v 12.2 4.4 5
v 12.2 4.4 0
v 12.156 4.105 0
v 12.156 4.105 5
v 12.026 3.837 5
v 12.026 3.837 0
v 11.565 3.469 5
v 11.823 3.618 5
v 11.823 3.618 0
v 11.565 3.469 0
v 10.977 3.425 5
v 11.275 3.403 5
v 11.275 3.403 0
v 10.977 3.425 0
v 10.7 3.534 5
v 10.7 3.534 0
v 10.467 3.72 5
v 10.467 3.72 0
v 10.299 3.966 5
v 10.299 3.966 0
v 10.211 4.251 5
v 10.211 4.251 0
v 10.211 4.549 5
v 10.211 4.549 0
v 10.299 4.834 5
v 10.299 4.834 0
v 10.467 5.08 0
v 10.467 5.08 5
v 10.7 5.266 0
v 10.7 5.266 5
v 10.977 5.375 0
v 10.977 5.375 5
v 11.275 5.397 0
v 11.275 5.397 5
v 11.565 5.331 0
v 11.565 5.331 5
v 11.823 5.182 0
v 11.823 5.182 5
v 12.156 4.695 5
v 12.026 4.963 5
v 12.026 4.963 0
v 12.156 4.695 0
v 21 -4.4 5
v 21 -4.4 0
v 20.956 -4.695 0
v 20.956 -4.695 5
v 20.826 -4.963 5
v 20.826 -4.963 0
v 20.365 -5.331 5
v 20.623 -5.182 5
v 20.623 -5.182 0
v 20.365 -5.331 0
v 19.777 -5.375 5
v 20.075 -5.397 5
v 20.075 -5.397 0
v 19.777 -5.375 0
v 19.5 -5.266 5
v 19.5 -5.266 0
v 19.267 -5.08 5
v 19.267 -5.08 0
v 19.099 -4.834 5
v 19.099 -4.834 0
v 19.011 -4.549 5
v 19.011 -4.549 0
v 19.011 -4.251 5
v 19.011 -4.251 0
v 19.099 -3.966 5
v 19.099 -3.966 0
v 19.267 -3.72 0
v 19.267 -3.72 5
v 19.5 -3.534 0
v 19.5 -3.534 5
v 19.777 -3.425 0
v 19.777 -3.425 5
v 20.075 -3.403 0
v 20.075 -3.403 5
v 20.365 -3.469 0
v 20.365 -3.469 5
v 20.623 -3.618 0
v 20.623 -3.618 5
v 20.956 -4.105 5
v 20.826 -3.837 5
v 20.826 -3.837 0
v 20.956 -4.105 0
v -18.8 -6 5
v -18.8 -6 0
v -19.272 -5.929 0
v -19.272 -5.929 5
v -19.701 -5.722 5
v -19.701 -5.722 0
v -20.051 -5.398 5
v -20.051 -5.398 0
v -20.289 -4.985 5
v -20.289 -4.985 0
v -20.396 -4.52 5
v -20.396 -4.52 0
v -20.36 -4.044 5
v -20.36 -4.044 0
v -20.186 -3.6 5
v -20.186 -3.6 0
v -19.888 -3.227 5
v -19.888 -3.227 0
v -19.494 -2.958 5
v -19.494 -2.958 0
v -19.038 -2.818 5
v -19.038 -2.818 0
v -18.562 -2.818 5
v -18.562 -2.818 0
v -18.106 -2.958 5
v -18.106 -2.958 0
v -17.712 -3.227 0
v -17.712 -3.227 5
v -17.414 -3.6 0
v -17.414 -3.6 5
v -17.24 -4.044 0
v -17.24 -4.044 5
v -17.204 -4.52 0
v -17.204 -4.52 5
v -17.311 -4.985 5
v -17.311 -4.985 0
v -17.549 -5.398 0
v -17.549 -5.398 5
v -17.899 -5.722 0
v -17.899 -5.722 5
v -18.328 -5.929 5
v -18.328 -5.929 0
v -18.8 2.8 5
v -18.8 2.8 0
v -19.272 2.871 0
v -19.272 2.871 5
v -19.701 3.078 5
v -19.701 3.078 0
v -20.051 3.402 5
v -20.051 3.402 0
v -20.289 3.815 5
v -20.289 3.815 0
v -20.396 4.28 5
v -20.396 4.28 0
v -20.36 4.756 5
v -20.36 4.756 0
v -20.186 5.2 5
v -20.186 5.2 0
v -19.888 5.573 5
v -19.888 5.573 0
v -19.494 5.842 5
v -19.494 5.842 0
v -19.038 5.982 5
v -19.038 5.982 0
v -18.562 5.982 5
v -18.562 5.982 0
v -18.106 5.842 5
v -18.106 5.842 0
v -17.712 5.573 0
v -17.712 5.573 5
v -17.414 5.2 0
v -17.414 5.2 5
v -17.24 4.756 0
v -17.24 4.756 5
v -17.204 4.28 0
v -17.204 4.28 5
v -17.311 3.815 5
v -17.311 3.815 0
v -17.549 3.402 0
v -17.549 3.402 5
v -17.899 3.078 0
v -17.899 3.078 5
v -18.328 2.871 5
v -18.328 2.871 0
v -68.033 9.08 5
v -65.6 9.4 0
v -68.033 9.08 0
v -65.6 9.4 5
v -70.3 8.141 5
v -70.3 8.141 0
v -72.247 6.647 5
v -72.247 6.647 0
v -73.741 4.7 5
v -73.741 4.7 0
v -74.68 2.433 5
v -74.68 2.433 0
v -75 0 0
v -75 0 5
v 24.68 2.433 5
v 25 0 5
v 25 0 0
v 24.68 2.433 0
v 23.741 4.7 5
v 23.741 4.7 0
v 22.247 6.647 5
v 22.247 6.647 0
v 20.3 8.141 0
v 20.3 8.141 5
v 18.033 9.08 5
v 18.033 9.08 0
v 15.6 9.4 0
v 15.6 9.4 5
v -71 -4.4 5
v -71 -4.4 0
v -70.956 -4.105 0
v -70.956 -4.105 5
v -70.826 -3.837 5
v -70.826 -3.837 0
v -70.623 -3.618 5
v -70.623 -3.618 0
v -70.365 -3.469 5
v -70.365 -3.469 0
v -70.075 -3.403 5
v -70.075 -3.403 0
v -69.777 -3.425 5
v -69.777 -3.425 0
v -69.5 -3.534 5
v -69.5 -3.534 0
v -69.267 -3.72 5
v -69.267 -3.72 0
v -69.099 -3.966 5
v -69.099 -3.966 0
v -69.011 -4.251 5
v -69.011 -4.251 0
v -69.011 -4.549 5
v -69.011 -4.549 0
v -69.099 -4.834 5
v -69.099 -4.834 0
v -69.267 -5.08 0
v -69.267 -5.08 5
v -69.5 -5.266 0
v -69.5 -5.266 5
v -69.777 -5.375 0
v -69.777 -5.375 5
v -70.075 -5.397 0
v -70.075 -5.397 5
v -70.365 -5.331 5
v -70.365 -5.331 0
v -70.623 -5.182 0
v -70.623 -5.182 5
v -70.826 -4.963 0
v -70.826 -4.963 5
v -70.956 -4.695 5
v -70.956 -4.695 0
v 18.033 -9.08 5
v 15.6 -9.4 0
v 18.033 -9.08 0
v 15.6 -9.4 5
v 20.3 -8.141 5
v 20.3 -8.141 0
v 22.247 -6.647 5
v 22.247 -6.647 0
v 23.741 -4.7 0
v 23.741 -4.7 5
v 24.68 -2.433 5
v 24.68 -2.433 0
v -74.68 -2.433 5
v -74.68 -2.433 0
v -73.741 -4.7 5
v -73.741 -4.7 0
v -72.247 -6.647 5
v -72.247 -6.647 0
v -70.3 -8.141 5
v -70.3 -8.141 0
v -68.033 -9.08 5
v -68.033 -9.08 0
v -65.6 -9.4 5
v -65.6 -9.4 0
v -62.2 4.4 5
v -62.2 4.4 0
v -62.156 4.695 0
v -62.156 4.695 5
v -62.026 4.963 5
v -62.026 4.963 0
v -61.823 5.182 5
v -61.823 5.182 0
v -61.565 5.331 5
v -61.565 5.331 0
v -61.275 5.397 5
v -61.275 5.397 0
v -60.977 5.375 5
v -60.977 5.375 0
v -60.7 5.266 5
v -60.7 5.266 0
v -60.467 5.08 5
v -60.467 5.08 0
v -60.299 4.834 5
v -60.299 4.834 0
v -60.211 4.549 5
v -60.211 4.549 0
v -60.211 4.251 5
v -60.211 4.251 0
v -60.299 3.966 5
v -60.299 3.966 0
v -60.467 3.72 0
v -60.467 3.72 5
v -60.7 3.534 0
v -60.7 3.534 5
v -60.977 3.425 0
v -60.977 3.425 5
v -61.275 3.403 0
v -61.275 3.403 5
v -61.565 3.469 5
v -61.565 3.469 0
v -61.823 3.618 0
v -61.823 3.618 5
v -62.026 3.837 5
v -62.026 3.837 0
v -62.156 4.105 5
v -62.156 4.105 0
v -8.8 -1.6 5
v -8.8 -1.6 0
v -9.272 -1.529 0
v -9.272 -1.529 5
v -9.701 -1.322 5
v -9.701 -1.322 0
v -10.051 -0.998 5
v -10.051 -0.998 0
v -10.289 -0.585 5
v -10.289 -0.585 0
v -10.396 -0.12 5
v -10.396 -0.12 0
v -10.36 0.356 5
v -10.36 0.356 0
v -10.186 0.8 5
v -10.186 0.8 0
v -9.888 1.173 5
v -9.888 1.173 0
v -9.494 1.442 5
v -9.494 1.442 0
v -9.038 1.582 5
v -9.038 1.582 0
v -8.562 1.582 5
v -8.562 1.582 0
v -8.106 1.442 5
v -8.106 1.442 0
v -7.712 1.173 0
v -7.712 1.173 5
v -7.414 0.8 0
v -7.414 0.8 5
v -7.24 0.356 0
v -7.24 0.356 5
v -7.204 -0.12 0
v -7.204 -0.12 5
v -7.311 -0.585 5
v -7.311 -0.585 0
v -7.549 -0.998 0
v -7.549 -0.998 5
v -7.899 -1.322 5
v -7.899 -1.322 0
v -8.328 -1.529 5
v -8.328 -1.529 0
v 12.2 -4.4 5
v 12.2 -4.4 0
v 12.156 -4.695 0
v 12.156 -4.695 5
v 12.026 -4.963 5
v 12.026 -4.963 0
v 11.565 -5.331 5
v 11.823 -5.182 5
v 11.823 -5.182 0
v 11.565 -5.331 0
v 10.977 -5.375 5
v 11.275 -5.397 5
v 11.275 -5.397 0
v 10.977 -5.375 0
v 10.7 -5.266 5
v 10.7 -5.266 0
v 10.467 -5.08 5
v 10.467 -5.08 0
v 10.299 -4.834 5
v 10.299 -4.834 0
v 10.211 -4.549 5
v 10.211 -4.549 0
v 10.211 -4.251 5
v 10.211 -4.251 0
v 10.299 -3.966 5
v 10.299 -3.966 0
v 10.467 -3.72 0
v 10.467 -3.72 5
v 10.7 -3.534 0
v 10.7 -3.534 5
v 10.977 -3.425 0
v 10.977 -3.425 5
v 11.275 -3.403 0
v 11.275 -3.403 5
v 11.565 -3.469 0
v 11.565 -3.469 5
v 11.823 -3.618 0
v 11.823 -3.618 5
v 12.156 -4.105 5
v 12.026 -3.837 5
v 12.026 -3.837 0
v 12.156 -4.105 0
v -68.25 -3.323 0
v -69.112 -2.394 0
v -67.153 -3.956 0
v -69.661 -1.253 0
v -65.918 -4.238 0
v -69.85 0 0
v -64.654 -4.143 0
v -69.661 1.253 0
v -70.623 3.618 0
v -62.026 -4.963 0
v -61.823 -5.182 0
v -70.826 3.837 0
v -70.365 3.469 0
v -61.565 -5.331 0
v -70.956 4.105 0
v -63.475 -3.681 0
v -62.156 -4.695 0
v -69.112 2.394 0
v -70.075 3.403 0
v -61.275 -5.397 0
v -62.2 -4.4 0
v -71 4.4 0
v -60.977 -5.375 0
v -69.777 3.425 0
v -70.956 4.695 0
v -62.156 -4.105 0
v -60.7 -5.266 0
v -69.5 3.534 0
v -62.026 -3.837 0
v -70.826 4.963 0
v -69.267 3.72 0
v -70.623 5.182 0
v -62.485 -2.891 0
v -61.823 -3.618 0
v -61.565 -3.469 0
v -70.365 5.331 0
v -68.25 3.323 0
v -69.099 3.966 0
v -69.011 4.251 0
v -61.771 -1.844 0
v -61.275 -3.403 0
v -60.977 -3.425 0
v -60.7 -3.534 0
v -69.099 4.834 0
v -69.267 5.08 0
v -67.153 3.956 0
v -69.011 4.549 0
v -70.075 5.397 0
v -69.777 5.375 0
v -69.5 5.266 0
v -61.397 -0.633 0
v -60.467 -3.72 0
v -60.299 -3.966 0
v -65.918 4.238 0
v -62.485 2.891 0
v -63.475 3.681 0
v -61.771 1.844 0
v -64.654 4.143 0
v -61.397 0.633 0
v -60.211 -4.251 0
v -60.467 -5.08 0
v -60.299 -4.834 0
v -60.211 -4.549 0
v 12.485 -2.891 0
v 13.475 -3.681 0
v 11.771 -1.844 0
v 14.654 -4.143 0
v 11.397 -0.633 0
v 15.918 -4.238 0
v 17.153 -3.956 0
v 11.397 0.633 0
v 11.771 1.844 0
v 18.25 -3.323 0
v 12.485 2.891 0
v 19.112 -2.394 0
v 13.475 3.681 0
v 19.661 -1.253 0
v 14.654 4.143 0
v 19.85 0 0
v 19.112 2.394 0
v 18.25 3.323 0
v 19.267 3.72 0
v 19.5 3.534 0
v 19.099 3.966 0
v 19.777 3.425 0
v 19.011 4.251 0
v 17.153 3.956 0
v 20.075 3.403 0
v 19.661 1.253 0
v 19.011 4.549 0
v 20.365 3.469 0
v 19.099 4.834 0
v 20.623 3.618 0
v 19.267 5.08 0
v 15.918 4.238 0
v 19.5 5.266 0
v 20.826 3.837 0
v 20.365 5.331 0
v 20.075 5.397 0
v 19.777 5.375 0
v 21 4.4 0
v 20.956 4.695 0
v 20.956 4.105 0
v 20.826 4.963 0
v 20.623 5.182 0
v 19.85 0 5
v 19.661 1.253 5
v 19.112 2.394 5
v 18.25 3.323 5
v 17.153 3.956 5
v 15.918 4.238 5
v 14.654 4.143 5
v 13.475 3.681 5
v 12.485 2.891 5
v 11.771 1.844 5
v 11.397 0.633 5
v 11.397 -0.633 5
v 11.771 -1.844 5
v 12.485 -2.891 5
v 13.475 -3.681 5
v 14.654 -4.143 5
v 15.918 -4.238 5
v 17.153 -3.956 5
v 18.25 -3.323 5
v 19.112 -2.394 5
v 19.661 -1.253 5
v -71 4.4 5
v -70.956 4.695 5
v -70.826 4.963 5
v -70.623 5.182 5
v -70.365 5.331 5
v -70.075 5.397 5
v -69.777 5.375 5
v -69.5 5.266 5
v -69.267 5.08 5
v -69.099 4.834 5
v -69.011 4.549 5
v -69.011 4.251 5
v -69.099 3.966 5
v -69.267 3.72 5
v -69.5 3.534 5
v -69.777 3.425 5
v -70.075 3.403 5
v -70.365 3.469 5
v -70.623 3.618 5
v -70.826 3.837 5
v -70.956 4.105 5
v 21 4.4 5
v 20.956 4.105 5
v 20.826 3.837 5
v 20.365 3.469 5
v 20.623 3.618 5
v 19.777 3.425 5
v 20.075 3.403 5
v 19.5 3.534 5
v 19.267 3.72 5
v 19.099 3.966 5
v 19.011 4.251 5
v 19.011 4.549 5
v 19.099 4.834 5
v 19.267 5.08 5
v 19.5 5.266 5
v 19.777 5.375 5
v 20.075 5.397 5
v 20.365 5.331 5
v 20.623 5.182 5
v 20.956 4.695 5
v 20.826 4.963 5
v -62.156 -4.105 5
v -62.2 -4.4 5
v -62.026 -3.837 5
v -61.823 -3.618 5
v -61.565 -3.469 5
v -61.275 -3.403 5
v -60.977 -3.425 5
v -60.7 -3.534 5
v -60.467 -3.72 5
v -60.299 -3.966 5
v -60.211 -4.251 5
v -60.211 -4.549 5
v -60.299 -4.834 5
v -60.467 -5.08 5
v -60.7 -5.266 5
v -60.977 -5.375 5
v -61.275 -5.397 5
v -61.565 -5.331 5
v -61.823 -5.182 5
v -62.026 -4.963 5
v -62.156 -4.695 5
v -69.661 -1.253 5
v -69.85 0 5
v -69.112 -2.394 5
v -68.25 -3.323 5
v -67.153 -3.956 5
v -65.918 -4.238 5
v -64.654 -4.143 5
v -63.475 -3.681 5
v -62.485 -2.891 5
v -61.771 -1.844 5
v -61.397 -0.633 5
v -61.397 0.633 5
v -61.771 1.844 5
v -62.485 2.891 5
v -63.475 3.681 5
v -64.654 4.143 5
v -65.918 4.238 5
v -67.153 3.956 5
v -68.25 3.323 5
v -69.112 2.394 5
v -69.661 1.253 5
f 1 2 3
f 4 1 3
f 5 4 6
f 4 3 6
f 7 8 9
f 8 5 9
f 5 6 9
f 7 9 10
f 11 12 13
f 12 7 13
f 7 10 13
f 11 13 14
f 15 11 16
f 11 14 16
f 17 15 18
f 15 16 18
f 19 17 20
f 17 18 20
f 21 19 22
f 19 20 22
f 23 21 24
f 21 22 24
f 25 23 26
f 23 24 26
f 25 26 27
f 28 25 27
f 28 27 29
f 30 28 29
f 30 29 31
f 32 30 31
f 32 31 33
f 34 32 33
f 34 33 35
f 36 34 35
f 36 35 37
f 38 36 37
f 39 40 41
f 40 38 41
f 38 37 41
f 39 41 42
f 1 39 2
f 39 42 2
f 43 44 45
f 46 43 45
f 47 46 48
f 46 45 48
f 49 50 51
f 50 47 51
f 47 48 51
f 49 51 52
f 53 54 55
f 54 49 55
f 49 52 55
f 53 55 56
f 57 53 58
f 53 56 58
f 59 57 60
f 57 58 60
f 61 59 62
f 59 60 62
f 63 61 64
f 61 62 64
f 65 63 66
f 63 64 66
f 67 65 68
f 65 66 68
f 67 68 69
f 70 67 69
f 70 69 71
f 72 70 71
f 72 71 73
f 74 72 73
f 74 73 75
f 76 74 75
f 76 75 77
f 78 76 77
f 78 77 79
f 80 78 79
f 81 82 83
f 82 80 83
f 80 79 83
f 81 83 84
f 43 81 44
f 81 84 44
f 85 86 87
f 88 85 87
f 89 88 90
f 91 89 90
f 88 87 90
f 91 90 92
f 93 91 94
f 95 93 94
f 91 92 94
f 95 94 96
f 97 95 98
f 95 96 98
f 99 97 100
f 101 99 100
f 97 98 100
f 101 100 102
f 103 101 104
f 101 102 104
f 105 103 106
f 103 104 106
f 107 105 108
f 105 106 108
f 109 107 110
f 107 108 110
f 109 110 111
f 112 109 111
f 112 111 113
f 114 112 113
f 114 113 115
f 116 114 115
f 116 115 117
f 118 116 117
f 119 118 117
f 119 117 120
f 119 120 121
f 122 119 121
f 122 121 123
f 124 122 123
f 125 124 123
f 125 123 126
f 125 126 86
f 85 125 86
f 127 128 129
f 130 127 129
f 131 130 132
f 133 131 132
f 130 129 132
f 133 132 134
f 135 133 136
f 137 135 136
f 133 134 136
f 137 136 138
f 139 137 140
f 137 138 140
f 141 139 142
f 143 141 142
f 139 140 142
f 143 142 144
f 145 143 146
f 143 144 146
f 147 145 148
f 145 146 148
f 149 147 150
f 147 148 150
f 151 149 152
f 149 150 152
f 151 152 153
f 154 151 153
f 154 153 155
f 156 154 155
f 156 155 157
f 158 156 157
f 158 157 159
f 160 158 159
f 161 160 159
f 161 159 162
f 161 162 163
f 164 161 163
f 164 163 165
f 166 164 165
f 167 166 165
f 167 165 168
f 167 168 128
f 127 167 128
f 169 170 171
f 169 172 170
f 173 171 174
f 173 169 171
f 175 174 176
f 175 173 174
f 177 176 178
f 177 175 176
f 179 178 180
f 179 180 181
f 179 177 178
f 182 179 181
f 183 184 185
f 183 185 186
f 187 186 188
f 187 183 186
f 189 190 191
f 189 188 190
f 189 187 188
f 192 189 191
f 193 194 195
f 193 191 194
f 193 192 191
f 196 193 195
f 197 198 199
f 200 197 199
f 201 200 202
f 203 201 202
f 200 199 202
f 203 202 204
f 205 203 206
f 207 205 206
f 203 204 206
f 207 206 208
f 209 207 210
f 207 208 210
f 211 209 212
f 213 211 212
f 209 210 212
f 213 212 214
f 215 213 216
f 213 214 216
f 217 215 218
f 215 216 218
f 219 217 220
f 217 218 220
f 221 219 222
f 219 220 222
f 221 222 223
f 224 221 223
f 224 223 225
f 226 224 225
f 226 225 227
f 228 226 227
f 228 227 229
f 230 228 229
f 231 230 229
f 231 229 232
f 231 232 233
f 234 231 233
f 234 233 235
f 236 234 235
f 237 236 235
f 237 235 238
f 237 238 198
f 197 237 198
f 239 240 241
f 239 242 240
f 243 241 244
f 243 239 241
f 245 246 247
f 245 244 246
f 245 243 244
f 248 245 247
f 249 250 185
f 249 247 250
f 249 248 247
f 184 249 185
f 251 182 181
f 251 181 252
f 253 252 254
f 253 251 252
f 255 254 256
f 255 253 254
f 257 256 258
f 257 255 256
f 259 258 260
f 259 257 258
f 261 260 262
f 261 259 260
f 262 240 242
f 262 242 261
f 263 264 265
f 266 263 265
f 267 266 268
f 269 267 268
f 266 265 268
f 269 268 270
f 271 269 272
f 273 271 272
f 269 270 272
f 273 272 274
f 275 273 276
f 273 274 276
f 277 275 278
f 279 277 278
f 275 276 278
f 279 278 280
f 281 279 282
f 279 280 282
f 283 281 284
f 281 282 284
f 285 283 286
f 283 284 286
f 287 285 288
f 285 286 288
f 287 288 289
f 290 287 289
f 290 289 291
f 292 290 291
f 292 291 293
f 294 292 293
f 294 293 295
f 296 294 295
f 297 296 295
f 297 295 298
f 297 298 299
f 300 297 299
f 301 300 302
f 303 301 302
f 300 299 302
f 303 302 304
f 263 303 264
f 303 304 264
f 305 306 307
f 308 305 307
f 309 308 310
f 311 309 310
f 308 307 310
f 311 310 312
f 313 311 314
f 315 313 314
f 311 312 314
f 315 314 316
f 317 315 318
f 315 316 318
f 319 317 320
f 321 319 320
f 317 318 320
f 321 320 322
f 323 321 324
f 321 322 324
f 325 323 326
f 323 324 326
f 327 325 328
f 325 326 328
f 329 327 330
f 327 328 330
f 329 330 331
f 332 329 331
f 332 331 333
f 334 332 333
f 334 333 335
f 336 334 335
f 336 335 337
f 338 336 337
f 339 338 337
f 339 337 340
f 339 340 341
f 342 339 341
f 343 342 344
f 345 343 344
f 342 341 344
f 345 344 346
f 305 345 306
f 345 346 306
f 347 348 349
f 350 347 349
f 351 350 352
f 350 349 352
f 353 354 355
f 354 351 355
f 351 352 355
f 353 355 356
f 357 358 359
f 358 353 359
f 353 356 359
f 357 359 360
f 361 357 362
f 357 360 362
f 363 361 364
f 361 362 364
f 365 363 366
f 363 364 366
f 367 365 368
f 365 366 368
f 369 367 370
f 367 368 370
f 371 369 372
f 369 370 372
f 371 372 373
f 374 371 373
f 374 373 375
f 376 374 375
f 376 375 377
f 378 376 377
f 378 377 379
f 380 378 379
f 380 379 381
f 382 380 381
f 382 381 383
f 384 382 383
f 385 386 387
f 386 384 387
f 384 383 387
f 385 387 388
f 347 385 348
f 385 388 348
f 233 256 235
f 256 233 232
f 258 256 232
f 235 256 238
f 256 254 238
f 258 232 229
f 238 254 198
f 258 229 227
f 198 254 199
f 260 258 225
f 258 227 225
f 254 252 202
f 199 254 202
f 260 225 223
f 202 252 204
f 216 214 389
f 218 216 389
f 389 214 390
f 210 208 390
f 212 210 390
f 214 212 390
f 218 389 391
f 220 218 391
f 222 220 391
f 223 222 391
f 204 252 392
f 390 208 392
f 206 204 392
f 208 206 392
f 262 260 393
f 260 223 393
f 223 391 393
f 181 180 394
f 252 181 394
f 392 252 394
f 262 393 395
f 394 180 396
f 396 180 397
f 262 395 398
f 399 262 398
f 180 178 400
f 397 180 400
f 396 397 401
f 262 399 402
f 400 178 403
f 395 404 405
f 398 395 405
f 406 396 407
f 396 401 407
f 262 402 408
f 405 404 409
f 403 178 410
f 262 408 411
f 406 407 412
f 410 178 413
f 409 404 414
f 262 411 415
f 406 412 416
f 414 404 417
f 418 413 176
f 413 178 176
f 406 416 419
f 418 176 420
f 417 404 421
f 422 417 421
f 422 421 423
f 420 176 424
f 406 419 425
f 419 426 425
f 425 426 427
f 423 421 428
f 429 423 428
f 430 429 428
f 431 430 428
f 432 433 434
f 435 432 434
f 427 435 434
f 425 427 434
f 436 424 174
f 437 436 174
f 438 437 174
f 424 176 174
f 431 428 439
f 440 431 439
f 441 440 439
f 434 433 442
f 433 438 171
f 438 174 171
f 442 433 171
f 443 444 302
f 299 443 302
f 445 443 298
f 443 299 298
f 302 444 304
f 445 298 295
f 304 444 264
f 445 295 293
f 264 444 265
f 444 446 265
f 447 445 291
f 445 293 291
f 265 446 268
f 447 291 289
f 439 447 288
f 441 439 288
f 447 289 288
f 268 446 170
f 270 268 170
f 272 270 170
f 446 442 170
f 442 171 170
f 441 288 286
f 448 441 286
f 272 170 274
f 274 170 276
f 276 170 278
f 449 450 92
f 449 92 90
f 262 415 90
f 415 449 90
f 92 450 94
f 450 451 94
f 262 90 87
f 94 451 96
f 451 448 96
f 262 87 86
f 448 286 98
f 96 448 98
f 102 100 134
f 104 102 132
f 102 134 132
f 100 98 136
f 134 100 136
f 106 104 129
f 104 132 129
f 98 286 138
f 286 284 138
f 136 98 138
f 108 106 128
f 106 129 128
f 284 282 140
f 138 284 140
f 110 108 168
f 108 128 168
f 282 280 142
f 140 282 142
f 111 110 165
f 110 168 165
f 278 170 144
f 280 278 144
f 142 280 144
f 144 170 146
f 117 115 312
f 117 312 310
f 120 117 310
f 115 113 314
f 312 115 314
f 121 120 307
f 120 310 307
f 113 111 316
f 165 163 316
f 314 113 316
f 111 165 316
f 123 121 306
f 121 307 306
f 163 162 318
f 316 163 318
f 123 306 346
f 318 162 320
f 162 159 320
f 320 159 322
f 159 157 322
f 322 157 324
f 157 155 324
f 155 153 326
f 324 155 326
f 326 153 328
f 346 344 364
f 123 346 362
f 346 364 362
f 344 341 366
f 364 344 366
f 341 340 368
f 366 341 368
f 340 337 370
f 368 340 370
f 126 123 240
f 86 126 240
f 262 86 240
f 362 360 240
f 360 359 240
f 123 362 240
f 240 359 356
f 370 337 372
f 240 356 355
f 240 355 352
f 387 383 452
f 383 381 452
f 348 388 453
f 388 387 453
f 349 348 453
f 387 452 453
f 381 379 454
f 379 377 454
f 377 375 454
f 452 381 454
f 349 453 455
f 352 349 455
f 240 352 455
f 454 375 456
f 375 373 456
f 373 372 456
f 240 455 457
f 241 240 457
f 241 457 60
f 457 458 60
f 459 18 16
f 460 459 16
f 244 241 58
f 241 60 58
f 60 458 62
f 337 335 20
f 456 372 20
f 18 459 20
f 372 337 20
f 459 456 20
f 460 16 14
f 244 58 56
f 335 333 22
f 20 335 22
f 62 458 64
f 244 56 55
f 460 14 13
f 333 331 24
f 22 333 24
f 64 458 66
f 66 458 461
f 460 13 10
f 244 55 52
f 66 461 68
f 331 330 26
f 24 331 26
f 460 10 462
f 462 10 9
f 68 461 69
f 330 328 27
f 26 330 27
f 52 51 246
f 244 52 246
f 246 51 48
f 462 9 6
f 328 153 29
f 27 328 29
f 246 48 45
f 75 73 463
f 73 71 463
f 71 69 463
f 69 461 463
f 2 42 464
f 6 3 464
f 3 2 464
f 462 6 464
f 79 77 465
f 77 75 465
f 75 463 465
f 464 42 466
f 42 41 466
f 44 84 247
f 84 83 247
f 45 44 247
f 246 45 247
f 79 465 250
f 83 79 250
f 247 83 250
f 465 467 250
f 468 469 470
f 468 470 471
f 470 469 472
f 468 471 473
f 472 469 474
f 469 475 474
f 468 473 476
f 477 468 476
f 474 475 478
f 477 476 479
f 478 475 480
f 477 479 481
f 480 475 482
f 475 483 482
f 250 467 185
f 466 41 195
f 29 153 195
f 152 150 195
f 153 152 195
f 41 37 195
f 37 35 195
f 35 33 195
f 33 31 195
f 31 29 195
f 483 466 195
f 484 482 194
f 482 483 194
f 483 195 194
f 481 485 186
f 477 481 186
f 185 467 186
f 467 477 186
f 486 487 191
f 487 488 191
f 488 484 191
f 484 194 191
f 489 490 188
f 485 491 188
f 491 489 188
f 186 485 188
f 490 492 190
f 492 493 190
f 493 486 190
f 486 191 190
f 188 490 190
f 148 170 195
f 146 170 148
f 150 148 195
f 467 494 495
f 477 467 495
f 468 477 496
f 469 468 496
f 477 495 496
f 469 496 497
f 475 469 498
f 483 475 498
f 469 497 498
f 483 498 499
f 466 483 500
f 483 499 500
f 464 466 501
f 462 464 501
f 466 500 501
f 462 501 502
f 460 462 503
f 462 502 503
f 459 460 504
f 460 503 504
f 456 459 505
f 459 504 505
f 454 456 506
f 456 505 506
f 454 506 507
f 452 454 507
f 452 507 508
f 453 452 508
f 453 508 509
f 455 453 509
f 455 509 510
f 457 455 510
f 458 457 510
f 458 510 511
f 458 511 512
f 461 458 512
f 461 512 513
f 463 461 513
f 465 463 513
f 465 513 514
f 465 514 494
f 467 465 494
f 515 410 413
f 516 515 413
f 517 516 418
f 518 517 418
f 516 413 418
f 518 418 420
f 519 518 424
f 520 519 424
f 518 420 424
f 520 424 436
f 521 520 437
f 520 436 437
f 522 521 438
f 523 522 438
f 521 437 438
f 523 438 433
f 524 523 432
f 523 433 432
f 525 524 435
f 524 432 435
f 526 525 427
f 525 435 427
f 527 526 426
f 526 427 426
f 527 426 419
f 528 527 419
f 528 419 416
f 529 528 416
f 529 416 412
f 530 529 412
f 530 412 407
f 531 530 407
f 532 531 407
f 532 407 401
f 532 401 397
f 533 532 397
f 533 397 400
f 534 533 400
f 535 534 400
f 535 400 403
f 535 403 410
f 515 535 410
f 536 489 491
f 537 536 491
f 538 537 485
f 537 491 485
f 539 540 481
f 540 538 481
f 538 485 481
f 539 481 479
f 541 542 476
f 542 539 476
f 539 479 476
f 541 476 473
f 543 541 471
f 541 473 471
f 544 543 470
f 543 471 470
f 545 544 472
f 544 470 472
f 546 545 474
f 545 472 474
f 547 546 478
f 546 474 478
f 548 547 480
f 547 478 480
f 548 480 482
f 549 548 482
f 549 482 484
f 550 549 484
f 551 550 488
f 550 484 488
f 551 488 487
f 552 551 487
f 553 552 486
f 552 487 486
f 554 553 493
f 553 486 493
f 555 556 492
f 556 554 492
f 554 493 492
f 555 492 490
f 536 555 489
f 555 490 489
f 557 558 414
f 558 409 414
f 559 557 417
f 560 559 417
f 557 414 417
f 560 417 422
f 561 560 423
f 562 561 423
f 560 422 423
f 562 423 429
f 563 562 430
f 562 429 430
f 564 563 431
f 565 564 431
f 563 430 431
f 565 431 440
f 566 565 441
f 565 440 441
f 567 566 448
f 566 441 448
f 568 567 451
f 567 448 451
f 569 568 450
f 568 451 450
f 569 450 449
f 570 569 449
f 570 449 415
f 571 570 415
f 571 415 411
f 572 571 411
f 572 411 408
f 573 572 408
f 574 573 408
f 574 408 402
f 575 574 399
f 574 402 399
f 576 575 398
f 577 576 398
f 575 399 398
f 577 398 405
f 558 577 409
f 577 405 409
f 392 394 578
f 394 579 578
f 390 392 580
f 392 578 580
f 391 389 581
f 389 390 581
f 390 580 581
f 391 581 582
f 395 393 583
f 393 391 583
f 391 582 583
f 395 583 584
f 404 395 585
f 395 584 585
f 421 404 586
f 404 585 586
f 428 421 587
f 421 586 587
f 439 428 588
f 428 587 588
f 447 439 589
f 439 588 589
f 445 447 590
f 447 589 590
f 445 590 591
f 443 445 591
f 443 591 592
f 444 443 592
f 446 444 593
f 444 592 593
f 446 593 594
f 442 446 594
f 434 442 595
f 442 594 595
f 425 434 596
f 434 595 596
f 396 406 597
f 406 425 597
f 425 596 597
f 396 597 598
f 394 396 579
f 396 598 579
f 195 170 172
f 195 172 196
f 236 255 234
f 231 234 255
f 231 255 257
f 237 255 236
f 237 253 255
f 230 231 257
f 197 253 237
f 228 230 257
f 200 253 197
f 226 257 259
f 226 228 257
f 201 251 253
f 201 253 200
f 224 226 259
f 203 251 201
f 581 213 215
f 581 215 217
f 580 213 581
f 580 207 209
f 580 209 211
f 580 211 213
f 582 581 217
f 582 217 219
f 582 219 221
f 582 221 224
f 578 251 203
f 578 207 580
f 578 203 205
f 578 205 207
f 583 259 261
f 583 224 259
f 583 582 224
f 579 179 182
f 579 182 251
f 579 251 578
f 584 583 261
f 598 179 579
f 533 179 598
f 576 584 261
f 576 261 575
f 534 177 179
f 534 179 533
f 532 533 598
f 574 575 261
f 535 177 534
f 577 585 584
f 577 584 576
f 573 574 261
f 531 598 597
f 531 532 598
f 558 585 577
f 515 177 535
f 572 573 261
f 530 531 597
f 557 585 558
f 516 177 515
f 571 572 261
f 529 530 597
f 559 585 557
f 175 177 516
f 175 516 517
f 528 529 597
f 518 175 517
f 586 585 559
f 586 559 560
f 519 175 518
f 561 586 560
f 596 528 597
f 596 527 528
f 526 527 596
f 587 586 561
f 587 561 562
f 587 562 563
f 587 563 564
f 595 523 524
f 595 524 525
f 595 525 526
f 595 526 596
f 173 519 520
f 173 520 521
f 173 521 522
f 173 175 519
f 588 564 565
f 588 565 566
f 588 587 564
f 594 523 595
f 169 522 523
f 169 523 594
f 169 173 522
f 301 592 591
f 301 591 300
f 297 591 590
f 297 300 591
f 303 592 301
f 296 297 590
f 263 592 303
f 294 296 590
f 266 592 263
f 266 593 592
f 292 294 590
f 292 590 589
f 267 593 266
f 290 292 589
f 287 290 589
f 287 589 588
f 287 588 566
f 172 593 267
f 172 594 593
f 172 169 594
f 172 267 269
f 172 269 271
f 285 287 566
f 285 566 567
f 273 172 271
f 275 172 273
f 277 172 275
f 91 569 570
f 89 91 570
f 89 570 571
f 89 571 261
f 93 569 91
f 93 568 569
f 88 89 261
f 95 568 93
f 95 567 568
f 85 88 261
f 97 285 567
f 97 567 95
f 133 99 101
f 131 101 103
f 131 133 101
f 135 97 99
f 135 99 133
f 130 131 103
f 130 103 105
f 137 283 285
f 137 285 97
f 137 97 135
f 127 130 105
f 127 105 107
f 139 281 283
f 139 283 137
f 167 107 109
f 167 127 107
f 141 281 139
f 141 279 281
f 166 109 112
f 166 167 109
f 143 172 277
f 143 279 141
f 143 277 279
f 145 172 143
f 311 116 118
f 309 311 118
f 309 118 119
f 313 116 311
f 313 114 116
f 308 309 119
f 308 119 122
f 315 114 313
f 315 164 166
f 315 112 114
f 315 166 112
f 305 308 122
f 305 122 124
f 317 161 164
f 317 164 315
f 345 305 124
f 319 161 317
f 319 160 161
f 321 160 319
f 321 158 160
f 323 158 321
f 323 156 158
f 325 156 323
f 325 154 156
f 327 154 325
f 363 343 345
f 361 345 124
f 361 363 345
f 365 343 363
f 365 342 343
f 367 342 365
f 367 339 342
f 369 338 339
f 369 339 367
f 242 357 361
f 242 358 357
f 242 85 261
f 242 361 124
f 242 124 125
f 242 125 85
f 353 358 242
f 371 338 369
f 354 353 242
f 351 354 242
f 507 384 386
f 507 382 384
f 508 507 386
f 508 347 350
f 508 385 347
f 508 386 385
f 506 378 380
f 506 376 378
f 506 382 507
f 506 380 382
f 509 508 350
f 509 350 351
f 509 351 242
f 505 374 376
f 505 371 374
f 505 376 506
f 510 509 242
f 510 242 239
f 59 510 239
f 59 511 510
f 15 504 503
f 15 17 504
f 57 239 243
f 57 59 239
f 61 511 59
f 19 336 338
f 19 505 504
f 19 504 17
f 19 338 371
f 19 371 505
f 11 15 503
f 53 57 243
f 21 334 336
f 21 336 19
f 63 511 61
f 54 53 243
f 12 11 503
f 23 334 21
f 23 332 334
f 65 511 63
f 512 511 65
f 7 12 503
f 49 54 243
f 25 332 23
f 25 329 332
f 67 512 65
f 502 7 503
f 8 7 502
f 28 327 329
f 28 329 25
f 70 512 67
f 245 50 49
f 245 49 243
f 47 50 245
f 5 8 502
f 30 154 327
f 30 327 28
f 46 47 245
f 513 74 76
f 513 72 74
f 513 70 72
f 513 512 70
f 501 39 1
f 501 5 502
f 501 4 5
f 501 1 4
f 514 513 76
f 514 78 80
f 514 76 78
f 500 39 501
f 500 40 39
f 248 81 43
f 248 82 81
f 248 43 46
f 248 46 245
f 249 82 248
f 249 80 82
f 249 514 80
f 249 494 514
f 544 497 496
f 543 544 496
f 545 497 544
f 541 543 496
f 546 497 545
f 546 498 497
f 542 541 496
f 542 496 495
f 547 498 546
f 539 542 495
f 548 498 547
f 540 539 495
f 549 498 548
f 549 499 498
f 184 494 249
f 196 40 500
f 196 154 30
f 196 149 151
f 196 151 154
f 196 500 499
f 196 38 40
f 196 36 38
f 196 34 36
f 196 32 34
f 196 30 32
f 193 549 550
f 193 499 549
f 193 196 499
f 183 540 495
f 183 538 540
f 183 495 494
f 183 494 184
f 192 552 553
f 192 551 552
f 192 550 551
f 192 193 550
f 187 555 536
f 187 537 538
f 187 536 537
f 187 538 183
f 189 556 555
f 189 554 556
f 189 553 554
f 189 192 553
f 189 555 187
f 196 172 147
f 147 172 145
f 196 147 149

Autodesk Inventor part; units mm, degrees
ref_plane "YZ Plane" through (0, 0, 0) normal (1, 0, 0) x (0, 1, 0)
ref_plane "XZ Plane" through (0, 0, 0) normal (0, 1, 0) x (-1, 0, 0)
ref_plane "XY Plane" through (0, 0, 0) normal (0, 0, 1) x (1, 0, 0)
sketch "スケッチ1" plane through (0, 0, 0) normal (0, 0, 1) x (1, 0, 0)
  line L0 (-25, 9.4) -> (25, 9.4)
  line L1 (25, 9.4) -> (25, -9.4)
  line L2 (25, -9.4) -> (-25, -9.4)
  line L3 (-25, -9.4) -> (-25, 9.4)
  line L4 (25, 0) -> (-25, 0)
  circle A0 centre (11.2, 4.4) radius 1
  circle A1 centre (20, 4.4) radius 1
  circle A2 centre (11.2, -4.4) radius 1
  circle A3 centre (20, -4.4) radius 1
  point P0 (0, 0)
  dimension "d0" = 50
  dimension "d1" = 18.8
  dimension "d2" = 9.4
  dimension "d3" = 25
  dimension "d4" = 8.8
  dimension "d5" = 8.8
  dimension "d6" = 8.8
  dimension "d7" = 8.8
  dimension "d8" = 8.8
  dimension "d9" = 5
  dimension "d10" = 2
  dimension "d11" = 2
  dimension "d12" = 2
  dimension "d13" = 2
extrude "押し出し1" add sketch "スケッチ1" along normal blind 5
fillet "フィレット1" radius 9.4 2 edges at (25, 9.4, 2.5) (25, -9.4, 2.5)
sketch "スケッチ2" plane through (0, 0, 5) normal (0, 0, 1) x (1, 0, 0)
  arc A0 (15.6, -9.4) -> (15.6, 9.4) centre (15.6, 0) ccw projected
  circle A1 centre (15.6, 0) radius 4.25
  point P0 (0, 0)
  dimension "d17" = 8.5
extrude "押し出し2" cut sketch "スケッチ2" against normal through all
mirror "ミラー1" about plane through (-25, 0, 0) normal (-1, 0, 0)
sketch "スケッチ3" plane through (0, 0, 5) normal (0, 0, 1) x (1, 0, 0)
  arc A0 (15.6, -9.4) -> (15.6, 9.4) centre (15.6, 0) ccw projected
  line L0 (-65.6, 9.4) -> (15.6, 9.4) projected
  arc A1 (-65.6, 9.4) -> (-65.6, -9.4) centre (-65.6, 0) ccw projected
  line L1 (-65.6, 0) -> (15.6, 0)
  circle A2 centre (11.2, -4.4) radius 1 projected
  point P0 (0, 0)
  point P1 (-18.8, 4.4)
  point P2 (-18.8, -4.4)
  point P3 (-8.8, 0)
  dimension "d20" = 8.8
  dimension "d32" = 20
  dimension "d33" = 4.4
  dimension "d34" = 10
  dimension "d35" = 10
hole "Hole1" at (-18.8, 4.4, 5) at (-18.8, -4.4, 5) at (-8.8, 0, 5) direction (0, 0, -1) diameter 3.2 depth 8 tip angle 118
equation "\"d2\" = 0.5 * d1"
equation "\"d3\" = 0.5 * d0"
equation "\"d5\" = d4"
equation "\"d6\" = d4"
equation "\"d7\" = d4"
equation "\"d8\" = d4"
equation "\"d33\" = 0.5 * d20"
properties part number "JointC4"
